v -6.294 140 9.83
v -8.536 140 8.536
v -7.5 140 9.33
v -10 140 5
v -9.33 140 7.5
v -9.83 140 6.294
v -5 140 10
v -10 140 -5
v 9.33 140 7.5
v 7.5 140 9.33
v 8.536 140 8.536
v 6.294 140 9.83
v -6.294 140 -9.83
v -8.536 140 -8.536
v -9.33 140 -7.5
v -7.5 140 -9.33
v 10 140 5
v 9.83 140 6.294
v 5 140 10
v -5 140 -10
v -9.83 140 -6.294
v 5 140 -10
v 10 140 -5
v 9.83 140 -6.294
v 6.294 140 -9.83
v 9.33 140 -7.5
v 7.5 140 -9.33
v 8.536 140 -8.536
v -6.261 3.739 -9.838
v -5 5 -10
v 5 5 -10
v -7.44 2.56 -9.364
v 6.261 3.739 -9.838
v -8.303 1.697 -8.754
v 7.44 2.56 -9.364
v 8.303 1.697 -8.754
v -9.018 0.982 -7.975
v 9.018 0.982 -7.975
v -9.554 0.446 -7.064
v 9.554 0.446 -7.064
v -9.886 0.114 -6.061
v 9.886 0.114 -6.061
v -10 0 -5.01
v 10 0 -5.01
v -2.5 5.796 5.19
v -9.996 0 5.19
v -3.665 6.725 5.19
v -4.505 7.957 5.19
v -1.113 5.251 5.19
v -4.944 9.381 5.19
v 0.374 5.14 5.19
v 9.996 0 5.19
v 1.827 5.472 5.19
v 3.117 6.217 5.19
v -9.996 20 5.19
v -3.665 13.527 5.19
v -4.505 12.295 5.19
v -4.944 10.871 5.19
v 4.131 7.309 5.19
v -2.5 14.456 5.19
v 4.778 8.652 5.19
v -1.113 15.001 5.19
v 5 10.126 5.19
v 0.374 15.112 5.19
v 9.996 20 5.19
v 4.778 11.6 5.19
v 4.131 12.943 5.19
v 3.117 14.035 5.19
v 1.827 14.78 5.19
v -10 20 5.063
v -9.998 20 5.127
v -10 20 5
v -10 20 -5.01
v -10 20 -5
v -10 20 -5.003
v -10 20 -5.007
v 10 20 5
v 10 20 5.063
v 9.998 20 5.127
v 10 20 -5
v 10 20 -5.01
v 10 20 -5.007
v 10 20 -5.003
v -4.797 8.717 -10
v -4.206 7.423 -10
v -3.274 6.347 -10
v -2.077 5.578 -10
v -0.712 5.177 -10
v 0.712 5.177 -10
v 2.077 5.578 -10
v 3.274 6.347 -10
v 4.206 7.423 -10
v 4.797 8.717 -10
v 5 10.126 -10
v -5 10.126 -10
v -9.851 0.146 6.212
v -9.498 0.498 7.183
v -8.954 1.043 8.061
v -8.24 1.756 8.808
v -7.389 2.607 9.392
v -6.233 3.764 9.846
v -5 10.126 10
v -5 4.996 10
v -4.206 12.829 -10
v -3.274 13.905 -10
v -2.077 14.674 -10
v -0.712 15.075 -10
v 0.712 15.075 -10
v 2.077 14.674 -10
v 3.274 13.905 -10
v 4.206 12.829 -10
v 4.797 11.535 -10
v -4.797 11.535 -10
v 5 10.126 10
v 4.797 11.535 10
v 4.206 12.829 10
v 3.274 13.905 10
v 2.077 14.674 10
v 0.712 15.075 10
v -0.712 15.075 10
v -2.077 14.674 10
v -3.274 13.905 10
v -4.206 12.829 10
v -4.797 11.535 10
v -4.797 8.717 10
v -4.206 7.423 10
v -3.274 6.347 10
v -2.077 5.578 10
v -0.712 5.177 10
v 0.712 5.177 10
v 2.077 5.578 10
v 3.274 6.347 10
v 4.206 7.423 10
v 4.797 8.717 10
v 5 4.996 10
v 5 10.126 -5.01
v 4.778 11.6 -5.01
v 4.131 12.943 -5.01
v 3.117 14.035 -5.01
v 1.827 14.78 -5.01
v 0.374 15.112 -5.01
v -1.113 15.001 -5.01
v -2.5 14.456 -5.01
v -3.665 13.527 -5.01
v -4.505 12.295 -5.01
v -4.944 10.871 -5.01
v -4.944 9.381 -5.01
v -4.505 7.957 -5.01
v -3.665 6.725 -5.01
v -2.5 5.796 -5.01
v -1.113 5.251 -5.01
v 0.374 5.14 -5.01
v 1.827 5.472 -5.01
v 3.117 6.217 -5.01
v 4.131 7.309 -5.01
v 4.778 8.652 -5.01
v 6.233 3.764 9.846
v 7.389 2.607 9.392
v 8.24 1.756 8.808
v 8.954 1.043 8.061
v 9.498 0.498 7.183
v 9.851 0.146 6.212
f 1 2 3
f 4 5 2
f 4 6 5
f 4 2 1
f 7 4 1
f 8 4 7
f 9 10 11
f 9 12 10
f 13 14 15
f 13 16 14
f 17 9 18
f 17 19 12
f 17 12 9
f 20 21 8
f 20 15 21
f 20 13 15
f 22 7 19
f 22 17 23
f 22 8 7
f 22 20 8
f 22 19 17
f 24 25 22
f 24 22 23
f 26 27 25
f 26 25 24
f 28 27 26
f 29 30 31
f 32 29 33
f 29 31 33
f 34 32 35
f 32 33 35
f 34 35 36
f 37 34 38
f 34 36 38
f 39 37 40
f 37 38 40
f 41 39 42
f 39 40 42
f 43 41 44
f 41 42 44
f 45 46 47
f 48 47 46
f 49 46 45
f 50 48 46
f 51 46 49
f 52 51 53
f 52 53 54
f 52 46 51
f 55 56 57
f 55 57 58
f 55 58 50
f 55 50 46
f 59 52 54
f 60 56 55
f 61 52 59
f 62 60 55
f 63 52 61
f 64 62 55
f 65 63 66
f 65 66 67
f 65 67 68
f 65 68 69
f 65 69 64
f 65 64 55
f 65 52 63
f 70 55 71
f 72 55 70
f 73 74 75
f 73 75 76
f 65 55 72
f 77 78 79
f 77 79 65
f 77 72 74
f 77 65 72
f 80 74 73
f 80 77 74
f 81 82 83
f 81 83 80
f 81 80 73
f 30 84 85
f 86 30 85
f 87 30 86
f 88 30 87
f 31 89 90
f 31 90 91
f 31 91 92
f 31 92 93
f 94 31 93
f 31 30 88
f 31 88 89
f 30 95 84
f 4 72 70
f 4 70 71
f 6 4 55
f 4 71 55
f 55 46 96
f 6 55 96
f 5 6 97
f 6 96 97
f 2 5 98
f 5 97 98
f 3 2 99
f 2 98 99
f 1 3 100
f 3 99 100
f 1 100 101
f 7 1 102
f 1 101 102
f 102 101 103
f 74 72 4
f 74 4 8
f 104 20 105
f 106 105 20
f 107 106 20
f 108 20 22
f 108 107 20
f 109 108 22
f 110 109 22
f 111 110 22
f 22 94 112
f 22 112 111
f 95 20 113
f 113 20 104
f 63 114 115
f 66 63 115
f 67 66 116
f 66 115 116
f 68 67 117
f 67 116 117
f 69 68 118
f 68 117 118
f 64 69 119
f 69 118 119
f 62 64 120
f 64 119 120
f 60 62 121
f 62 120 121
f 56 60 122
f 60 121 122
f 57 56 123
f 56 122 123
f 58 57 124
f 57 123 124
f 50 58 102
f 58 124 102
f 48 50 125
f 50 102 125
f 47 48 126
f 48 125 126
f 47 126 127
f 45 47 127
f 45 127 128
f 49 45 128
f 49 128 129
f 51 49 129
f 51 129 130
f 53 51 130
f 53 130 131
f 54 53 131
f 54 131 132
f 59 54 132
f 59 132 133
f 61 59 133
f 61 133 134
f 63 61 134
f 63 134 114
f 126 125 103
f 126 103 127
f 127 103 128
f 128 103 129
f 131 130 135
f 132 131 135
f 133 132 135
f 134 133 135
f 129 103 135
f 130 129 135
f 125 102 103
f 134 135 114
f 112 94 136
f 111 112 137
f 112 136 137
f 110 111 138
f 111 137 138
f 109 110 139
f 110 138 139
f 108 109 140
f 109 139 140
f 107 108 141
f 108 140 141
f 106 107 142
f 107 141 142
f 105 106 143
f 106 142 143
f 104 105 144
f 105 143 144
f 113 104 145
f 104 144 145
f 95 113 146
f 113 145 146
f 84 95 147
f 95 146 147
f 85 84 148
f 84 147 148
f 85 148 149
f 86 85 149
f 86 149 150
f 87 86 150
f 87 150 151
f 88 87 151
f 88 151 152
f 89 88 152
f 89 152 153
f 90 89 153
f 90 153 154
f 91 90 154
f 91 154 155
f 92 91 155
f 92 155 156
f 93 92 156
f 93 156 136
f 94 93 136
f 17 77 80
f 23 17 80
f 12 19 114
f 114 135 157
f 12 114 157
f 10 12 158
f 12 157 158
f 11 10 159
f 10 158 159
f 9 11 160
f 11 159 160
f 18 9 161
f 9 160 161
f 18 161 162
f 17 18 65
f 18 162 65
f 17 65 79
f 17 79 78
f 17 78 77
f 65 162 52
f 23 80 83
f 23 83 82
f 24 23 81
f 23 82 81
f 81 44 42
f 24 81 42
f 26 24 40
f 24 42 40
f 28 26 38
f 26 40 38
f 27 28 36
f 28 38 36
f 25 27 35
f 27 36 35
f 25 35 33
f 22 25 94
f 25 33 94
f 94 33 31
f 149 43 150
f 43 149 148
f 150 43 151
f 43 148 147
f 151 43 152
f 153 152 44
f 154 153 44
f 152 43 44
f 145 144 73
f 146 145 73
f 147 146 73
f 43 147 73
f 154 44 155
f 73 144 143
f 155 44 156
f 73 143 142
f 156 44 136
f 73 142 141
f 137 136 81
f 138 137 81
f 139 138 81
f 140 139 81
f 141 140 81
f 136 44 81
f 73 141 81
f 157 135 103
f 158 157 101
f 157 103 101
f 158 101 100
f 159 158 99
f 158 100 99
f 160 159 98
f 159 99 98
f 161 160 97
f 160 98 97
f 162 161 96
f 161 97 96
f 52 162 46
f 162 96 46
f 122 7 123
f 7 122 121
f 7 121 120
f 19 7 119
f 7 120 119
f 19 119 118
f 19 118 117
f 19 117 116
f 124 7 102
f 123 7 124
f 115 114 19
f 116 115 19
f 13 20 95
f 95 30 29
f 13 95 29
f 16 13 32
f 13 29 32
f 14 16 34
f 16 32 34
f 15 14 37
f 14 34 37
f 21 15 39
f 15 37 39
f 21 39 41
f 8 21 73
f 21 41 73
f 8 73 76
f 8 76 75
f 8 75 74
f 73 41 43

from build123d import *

# Parameters (mm, degrees)
SKETCH1_W           = 20
SKETCH1_H           = 20
BOSS_EXTRUDE1_DEPTH = 140
SKETCH2_R           = 5
CUT_EXTRUDE1_DEPTH  = 142.774468788
SKETCH3_W           = 10.2
SKETCH3_H           = 20
CUT_EXTRUDE2_DEPTH  = 142.774468788
FILLET1_R           = 5


with BuildPart() as part:
    # Sketch1 → Boss-Extrude1 (new body)
    with BuildSketch(Plane(origin=(0, 0, 0), x_dir=(1, 0, 0), z_dir=(0, 1, 0))):
        Rectangle(SKETCH1_W, SKETCH1_H)
    extrude(amount=BOSS_EXTRUDE1_DEPTH)

    # Sketch2 → Cut-Extrude1 (cut, through all)
    with BuildSketch(Plane.XY.offset(10)):
        with Locations((0, 10.125979961)):
            Circle(SKETCH2_R)
    extrude(amount=-CUT_EXTRUDE1_DEPTH, mode=Mode.SUBTRACT)

    # Sketch3 → Cut-Extrude2 (cut, through all)
    with BuildSketch(Plane(origin=(10, 0, 0), x_dir=(0, 0, -1), z_dir=(1, 0, 0))):
        with Locations((-0.09, 10)):
            Rectangle(SKETCH3_W, SKETCH3_H)
    extrude(amount=-CUT_EXTRUDE2_DEPTH, mode=Mode.SUBTRACT)

    # Fillet1
    # the kernel refuses this fillet: 5 mm, written as the material it takes off along each edge
    with BuildSketch(Plane(origin=(22.5, 0, -10), x_dir=(0, 0, 1), z_dir=(-1, 0, 0))) as fillet1_piece_1:
        with BuildLine():
            CenterArc((FILLET1_R, FILLET1_R), FILLET1_R, 180, 90)
            Line((0, FILLET1_R), (0, 0))
            Line((0, 0), (FILLET1_R, 0))
        make_face()
    extrude(amount=45, mode=Mode.SUBTRACT)
    with BuildSketch(Plane(origin=(-22.49097174, 0, 10), x_dir=(0, 1, 0), z_dir=(1, 0, 0))) as fillet1_piece_2:
        with BuildLine():
            CenterArc((4.996388696, -5), FILLET1_R, 90, 87.822236049)
            Line((0, -4.81), (0, 0))
            Line((0, 0), (4.996388696, 0))
        make_face()
    extrude(amount=44.981943479, mode=Mode.SUBTRACT)
    with BuildSketch(Plane(origin=(-10, -12.5, -10), x_dir=(0, 0, 1), z_dir=(0, 1, 0)), Plane(origin=(-10, -12.5, 10), x_dir=(1, 0, 0), z_dir=(0, 1, 0))) as fillet1_piece_3:
        with BuildLine():
            CenterArc((FILLET1_R, FILLET1_R), FILLET1_R, 180, 90)
            Line((0, FILLET1_R), (0, 0))
            Line((0, 0), (FILLET1_R, 0))
        make_face()
    extrude(amount=165, mode=Mode.SUBTRACT)
    with BuildSketch(Plane(origin=(10, -12.5, -10), x_dir=(0, 0, 1), z_dir=(0, 1, 0)), Plane(origin=(10, -12.5, 10), x_dir=(-1, 0, 0), z_dir=(0, 1, 0))) as fillet1_piece_4:
        with BuildLine():
            CenterArc((FILLET1_R, -FILLET1_R), FILLET1_R, 90, 90)
            Line((0, -FILLET1_R), (0, 0))
            Line((0, 0), (FILLET1_R, 0))
        make_face()
    extrude(amount=165, mode=Mode.SUBTRACT)


solid = part.part
